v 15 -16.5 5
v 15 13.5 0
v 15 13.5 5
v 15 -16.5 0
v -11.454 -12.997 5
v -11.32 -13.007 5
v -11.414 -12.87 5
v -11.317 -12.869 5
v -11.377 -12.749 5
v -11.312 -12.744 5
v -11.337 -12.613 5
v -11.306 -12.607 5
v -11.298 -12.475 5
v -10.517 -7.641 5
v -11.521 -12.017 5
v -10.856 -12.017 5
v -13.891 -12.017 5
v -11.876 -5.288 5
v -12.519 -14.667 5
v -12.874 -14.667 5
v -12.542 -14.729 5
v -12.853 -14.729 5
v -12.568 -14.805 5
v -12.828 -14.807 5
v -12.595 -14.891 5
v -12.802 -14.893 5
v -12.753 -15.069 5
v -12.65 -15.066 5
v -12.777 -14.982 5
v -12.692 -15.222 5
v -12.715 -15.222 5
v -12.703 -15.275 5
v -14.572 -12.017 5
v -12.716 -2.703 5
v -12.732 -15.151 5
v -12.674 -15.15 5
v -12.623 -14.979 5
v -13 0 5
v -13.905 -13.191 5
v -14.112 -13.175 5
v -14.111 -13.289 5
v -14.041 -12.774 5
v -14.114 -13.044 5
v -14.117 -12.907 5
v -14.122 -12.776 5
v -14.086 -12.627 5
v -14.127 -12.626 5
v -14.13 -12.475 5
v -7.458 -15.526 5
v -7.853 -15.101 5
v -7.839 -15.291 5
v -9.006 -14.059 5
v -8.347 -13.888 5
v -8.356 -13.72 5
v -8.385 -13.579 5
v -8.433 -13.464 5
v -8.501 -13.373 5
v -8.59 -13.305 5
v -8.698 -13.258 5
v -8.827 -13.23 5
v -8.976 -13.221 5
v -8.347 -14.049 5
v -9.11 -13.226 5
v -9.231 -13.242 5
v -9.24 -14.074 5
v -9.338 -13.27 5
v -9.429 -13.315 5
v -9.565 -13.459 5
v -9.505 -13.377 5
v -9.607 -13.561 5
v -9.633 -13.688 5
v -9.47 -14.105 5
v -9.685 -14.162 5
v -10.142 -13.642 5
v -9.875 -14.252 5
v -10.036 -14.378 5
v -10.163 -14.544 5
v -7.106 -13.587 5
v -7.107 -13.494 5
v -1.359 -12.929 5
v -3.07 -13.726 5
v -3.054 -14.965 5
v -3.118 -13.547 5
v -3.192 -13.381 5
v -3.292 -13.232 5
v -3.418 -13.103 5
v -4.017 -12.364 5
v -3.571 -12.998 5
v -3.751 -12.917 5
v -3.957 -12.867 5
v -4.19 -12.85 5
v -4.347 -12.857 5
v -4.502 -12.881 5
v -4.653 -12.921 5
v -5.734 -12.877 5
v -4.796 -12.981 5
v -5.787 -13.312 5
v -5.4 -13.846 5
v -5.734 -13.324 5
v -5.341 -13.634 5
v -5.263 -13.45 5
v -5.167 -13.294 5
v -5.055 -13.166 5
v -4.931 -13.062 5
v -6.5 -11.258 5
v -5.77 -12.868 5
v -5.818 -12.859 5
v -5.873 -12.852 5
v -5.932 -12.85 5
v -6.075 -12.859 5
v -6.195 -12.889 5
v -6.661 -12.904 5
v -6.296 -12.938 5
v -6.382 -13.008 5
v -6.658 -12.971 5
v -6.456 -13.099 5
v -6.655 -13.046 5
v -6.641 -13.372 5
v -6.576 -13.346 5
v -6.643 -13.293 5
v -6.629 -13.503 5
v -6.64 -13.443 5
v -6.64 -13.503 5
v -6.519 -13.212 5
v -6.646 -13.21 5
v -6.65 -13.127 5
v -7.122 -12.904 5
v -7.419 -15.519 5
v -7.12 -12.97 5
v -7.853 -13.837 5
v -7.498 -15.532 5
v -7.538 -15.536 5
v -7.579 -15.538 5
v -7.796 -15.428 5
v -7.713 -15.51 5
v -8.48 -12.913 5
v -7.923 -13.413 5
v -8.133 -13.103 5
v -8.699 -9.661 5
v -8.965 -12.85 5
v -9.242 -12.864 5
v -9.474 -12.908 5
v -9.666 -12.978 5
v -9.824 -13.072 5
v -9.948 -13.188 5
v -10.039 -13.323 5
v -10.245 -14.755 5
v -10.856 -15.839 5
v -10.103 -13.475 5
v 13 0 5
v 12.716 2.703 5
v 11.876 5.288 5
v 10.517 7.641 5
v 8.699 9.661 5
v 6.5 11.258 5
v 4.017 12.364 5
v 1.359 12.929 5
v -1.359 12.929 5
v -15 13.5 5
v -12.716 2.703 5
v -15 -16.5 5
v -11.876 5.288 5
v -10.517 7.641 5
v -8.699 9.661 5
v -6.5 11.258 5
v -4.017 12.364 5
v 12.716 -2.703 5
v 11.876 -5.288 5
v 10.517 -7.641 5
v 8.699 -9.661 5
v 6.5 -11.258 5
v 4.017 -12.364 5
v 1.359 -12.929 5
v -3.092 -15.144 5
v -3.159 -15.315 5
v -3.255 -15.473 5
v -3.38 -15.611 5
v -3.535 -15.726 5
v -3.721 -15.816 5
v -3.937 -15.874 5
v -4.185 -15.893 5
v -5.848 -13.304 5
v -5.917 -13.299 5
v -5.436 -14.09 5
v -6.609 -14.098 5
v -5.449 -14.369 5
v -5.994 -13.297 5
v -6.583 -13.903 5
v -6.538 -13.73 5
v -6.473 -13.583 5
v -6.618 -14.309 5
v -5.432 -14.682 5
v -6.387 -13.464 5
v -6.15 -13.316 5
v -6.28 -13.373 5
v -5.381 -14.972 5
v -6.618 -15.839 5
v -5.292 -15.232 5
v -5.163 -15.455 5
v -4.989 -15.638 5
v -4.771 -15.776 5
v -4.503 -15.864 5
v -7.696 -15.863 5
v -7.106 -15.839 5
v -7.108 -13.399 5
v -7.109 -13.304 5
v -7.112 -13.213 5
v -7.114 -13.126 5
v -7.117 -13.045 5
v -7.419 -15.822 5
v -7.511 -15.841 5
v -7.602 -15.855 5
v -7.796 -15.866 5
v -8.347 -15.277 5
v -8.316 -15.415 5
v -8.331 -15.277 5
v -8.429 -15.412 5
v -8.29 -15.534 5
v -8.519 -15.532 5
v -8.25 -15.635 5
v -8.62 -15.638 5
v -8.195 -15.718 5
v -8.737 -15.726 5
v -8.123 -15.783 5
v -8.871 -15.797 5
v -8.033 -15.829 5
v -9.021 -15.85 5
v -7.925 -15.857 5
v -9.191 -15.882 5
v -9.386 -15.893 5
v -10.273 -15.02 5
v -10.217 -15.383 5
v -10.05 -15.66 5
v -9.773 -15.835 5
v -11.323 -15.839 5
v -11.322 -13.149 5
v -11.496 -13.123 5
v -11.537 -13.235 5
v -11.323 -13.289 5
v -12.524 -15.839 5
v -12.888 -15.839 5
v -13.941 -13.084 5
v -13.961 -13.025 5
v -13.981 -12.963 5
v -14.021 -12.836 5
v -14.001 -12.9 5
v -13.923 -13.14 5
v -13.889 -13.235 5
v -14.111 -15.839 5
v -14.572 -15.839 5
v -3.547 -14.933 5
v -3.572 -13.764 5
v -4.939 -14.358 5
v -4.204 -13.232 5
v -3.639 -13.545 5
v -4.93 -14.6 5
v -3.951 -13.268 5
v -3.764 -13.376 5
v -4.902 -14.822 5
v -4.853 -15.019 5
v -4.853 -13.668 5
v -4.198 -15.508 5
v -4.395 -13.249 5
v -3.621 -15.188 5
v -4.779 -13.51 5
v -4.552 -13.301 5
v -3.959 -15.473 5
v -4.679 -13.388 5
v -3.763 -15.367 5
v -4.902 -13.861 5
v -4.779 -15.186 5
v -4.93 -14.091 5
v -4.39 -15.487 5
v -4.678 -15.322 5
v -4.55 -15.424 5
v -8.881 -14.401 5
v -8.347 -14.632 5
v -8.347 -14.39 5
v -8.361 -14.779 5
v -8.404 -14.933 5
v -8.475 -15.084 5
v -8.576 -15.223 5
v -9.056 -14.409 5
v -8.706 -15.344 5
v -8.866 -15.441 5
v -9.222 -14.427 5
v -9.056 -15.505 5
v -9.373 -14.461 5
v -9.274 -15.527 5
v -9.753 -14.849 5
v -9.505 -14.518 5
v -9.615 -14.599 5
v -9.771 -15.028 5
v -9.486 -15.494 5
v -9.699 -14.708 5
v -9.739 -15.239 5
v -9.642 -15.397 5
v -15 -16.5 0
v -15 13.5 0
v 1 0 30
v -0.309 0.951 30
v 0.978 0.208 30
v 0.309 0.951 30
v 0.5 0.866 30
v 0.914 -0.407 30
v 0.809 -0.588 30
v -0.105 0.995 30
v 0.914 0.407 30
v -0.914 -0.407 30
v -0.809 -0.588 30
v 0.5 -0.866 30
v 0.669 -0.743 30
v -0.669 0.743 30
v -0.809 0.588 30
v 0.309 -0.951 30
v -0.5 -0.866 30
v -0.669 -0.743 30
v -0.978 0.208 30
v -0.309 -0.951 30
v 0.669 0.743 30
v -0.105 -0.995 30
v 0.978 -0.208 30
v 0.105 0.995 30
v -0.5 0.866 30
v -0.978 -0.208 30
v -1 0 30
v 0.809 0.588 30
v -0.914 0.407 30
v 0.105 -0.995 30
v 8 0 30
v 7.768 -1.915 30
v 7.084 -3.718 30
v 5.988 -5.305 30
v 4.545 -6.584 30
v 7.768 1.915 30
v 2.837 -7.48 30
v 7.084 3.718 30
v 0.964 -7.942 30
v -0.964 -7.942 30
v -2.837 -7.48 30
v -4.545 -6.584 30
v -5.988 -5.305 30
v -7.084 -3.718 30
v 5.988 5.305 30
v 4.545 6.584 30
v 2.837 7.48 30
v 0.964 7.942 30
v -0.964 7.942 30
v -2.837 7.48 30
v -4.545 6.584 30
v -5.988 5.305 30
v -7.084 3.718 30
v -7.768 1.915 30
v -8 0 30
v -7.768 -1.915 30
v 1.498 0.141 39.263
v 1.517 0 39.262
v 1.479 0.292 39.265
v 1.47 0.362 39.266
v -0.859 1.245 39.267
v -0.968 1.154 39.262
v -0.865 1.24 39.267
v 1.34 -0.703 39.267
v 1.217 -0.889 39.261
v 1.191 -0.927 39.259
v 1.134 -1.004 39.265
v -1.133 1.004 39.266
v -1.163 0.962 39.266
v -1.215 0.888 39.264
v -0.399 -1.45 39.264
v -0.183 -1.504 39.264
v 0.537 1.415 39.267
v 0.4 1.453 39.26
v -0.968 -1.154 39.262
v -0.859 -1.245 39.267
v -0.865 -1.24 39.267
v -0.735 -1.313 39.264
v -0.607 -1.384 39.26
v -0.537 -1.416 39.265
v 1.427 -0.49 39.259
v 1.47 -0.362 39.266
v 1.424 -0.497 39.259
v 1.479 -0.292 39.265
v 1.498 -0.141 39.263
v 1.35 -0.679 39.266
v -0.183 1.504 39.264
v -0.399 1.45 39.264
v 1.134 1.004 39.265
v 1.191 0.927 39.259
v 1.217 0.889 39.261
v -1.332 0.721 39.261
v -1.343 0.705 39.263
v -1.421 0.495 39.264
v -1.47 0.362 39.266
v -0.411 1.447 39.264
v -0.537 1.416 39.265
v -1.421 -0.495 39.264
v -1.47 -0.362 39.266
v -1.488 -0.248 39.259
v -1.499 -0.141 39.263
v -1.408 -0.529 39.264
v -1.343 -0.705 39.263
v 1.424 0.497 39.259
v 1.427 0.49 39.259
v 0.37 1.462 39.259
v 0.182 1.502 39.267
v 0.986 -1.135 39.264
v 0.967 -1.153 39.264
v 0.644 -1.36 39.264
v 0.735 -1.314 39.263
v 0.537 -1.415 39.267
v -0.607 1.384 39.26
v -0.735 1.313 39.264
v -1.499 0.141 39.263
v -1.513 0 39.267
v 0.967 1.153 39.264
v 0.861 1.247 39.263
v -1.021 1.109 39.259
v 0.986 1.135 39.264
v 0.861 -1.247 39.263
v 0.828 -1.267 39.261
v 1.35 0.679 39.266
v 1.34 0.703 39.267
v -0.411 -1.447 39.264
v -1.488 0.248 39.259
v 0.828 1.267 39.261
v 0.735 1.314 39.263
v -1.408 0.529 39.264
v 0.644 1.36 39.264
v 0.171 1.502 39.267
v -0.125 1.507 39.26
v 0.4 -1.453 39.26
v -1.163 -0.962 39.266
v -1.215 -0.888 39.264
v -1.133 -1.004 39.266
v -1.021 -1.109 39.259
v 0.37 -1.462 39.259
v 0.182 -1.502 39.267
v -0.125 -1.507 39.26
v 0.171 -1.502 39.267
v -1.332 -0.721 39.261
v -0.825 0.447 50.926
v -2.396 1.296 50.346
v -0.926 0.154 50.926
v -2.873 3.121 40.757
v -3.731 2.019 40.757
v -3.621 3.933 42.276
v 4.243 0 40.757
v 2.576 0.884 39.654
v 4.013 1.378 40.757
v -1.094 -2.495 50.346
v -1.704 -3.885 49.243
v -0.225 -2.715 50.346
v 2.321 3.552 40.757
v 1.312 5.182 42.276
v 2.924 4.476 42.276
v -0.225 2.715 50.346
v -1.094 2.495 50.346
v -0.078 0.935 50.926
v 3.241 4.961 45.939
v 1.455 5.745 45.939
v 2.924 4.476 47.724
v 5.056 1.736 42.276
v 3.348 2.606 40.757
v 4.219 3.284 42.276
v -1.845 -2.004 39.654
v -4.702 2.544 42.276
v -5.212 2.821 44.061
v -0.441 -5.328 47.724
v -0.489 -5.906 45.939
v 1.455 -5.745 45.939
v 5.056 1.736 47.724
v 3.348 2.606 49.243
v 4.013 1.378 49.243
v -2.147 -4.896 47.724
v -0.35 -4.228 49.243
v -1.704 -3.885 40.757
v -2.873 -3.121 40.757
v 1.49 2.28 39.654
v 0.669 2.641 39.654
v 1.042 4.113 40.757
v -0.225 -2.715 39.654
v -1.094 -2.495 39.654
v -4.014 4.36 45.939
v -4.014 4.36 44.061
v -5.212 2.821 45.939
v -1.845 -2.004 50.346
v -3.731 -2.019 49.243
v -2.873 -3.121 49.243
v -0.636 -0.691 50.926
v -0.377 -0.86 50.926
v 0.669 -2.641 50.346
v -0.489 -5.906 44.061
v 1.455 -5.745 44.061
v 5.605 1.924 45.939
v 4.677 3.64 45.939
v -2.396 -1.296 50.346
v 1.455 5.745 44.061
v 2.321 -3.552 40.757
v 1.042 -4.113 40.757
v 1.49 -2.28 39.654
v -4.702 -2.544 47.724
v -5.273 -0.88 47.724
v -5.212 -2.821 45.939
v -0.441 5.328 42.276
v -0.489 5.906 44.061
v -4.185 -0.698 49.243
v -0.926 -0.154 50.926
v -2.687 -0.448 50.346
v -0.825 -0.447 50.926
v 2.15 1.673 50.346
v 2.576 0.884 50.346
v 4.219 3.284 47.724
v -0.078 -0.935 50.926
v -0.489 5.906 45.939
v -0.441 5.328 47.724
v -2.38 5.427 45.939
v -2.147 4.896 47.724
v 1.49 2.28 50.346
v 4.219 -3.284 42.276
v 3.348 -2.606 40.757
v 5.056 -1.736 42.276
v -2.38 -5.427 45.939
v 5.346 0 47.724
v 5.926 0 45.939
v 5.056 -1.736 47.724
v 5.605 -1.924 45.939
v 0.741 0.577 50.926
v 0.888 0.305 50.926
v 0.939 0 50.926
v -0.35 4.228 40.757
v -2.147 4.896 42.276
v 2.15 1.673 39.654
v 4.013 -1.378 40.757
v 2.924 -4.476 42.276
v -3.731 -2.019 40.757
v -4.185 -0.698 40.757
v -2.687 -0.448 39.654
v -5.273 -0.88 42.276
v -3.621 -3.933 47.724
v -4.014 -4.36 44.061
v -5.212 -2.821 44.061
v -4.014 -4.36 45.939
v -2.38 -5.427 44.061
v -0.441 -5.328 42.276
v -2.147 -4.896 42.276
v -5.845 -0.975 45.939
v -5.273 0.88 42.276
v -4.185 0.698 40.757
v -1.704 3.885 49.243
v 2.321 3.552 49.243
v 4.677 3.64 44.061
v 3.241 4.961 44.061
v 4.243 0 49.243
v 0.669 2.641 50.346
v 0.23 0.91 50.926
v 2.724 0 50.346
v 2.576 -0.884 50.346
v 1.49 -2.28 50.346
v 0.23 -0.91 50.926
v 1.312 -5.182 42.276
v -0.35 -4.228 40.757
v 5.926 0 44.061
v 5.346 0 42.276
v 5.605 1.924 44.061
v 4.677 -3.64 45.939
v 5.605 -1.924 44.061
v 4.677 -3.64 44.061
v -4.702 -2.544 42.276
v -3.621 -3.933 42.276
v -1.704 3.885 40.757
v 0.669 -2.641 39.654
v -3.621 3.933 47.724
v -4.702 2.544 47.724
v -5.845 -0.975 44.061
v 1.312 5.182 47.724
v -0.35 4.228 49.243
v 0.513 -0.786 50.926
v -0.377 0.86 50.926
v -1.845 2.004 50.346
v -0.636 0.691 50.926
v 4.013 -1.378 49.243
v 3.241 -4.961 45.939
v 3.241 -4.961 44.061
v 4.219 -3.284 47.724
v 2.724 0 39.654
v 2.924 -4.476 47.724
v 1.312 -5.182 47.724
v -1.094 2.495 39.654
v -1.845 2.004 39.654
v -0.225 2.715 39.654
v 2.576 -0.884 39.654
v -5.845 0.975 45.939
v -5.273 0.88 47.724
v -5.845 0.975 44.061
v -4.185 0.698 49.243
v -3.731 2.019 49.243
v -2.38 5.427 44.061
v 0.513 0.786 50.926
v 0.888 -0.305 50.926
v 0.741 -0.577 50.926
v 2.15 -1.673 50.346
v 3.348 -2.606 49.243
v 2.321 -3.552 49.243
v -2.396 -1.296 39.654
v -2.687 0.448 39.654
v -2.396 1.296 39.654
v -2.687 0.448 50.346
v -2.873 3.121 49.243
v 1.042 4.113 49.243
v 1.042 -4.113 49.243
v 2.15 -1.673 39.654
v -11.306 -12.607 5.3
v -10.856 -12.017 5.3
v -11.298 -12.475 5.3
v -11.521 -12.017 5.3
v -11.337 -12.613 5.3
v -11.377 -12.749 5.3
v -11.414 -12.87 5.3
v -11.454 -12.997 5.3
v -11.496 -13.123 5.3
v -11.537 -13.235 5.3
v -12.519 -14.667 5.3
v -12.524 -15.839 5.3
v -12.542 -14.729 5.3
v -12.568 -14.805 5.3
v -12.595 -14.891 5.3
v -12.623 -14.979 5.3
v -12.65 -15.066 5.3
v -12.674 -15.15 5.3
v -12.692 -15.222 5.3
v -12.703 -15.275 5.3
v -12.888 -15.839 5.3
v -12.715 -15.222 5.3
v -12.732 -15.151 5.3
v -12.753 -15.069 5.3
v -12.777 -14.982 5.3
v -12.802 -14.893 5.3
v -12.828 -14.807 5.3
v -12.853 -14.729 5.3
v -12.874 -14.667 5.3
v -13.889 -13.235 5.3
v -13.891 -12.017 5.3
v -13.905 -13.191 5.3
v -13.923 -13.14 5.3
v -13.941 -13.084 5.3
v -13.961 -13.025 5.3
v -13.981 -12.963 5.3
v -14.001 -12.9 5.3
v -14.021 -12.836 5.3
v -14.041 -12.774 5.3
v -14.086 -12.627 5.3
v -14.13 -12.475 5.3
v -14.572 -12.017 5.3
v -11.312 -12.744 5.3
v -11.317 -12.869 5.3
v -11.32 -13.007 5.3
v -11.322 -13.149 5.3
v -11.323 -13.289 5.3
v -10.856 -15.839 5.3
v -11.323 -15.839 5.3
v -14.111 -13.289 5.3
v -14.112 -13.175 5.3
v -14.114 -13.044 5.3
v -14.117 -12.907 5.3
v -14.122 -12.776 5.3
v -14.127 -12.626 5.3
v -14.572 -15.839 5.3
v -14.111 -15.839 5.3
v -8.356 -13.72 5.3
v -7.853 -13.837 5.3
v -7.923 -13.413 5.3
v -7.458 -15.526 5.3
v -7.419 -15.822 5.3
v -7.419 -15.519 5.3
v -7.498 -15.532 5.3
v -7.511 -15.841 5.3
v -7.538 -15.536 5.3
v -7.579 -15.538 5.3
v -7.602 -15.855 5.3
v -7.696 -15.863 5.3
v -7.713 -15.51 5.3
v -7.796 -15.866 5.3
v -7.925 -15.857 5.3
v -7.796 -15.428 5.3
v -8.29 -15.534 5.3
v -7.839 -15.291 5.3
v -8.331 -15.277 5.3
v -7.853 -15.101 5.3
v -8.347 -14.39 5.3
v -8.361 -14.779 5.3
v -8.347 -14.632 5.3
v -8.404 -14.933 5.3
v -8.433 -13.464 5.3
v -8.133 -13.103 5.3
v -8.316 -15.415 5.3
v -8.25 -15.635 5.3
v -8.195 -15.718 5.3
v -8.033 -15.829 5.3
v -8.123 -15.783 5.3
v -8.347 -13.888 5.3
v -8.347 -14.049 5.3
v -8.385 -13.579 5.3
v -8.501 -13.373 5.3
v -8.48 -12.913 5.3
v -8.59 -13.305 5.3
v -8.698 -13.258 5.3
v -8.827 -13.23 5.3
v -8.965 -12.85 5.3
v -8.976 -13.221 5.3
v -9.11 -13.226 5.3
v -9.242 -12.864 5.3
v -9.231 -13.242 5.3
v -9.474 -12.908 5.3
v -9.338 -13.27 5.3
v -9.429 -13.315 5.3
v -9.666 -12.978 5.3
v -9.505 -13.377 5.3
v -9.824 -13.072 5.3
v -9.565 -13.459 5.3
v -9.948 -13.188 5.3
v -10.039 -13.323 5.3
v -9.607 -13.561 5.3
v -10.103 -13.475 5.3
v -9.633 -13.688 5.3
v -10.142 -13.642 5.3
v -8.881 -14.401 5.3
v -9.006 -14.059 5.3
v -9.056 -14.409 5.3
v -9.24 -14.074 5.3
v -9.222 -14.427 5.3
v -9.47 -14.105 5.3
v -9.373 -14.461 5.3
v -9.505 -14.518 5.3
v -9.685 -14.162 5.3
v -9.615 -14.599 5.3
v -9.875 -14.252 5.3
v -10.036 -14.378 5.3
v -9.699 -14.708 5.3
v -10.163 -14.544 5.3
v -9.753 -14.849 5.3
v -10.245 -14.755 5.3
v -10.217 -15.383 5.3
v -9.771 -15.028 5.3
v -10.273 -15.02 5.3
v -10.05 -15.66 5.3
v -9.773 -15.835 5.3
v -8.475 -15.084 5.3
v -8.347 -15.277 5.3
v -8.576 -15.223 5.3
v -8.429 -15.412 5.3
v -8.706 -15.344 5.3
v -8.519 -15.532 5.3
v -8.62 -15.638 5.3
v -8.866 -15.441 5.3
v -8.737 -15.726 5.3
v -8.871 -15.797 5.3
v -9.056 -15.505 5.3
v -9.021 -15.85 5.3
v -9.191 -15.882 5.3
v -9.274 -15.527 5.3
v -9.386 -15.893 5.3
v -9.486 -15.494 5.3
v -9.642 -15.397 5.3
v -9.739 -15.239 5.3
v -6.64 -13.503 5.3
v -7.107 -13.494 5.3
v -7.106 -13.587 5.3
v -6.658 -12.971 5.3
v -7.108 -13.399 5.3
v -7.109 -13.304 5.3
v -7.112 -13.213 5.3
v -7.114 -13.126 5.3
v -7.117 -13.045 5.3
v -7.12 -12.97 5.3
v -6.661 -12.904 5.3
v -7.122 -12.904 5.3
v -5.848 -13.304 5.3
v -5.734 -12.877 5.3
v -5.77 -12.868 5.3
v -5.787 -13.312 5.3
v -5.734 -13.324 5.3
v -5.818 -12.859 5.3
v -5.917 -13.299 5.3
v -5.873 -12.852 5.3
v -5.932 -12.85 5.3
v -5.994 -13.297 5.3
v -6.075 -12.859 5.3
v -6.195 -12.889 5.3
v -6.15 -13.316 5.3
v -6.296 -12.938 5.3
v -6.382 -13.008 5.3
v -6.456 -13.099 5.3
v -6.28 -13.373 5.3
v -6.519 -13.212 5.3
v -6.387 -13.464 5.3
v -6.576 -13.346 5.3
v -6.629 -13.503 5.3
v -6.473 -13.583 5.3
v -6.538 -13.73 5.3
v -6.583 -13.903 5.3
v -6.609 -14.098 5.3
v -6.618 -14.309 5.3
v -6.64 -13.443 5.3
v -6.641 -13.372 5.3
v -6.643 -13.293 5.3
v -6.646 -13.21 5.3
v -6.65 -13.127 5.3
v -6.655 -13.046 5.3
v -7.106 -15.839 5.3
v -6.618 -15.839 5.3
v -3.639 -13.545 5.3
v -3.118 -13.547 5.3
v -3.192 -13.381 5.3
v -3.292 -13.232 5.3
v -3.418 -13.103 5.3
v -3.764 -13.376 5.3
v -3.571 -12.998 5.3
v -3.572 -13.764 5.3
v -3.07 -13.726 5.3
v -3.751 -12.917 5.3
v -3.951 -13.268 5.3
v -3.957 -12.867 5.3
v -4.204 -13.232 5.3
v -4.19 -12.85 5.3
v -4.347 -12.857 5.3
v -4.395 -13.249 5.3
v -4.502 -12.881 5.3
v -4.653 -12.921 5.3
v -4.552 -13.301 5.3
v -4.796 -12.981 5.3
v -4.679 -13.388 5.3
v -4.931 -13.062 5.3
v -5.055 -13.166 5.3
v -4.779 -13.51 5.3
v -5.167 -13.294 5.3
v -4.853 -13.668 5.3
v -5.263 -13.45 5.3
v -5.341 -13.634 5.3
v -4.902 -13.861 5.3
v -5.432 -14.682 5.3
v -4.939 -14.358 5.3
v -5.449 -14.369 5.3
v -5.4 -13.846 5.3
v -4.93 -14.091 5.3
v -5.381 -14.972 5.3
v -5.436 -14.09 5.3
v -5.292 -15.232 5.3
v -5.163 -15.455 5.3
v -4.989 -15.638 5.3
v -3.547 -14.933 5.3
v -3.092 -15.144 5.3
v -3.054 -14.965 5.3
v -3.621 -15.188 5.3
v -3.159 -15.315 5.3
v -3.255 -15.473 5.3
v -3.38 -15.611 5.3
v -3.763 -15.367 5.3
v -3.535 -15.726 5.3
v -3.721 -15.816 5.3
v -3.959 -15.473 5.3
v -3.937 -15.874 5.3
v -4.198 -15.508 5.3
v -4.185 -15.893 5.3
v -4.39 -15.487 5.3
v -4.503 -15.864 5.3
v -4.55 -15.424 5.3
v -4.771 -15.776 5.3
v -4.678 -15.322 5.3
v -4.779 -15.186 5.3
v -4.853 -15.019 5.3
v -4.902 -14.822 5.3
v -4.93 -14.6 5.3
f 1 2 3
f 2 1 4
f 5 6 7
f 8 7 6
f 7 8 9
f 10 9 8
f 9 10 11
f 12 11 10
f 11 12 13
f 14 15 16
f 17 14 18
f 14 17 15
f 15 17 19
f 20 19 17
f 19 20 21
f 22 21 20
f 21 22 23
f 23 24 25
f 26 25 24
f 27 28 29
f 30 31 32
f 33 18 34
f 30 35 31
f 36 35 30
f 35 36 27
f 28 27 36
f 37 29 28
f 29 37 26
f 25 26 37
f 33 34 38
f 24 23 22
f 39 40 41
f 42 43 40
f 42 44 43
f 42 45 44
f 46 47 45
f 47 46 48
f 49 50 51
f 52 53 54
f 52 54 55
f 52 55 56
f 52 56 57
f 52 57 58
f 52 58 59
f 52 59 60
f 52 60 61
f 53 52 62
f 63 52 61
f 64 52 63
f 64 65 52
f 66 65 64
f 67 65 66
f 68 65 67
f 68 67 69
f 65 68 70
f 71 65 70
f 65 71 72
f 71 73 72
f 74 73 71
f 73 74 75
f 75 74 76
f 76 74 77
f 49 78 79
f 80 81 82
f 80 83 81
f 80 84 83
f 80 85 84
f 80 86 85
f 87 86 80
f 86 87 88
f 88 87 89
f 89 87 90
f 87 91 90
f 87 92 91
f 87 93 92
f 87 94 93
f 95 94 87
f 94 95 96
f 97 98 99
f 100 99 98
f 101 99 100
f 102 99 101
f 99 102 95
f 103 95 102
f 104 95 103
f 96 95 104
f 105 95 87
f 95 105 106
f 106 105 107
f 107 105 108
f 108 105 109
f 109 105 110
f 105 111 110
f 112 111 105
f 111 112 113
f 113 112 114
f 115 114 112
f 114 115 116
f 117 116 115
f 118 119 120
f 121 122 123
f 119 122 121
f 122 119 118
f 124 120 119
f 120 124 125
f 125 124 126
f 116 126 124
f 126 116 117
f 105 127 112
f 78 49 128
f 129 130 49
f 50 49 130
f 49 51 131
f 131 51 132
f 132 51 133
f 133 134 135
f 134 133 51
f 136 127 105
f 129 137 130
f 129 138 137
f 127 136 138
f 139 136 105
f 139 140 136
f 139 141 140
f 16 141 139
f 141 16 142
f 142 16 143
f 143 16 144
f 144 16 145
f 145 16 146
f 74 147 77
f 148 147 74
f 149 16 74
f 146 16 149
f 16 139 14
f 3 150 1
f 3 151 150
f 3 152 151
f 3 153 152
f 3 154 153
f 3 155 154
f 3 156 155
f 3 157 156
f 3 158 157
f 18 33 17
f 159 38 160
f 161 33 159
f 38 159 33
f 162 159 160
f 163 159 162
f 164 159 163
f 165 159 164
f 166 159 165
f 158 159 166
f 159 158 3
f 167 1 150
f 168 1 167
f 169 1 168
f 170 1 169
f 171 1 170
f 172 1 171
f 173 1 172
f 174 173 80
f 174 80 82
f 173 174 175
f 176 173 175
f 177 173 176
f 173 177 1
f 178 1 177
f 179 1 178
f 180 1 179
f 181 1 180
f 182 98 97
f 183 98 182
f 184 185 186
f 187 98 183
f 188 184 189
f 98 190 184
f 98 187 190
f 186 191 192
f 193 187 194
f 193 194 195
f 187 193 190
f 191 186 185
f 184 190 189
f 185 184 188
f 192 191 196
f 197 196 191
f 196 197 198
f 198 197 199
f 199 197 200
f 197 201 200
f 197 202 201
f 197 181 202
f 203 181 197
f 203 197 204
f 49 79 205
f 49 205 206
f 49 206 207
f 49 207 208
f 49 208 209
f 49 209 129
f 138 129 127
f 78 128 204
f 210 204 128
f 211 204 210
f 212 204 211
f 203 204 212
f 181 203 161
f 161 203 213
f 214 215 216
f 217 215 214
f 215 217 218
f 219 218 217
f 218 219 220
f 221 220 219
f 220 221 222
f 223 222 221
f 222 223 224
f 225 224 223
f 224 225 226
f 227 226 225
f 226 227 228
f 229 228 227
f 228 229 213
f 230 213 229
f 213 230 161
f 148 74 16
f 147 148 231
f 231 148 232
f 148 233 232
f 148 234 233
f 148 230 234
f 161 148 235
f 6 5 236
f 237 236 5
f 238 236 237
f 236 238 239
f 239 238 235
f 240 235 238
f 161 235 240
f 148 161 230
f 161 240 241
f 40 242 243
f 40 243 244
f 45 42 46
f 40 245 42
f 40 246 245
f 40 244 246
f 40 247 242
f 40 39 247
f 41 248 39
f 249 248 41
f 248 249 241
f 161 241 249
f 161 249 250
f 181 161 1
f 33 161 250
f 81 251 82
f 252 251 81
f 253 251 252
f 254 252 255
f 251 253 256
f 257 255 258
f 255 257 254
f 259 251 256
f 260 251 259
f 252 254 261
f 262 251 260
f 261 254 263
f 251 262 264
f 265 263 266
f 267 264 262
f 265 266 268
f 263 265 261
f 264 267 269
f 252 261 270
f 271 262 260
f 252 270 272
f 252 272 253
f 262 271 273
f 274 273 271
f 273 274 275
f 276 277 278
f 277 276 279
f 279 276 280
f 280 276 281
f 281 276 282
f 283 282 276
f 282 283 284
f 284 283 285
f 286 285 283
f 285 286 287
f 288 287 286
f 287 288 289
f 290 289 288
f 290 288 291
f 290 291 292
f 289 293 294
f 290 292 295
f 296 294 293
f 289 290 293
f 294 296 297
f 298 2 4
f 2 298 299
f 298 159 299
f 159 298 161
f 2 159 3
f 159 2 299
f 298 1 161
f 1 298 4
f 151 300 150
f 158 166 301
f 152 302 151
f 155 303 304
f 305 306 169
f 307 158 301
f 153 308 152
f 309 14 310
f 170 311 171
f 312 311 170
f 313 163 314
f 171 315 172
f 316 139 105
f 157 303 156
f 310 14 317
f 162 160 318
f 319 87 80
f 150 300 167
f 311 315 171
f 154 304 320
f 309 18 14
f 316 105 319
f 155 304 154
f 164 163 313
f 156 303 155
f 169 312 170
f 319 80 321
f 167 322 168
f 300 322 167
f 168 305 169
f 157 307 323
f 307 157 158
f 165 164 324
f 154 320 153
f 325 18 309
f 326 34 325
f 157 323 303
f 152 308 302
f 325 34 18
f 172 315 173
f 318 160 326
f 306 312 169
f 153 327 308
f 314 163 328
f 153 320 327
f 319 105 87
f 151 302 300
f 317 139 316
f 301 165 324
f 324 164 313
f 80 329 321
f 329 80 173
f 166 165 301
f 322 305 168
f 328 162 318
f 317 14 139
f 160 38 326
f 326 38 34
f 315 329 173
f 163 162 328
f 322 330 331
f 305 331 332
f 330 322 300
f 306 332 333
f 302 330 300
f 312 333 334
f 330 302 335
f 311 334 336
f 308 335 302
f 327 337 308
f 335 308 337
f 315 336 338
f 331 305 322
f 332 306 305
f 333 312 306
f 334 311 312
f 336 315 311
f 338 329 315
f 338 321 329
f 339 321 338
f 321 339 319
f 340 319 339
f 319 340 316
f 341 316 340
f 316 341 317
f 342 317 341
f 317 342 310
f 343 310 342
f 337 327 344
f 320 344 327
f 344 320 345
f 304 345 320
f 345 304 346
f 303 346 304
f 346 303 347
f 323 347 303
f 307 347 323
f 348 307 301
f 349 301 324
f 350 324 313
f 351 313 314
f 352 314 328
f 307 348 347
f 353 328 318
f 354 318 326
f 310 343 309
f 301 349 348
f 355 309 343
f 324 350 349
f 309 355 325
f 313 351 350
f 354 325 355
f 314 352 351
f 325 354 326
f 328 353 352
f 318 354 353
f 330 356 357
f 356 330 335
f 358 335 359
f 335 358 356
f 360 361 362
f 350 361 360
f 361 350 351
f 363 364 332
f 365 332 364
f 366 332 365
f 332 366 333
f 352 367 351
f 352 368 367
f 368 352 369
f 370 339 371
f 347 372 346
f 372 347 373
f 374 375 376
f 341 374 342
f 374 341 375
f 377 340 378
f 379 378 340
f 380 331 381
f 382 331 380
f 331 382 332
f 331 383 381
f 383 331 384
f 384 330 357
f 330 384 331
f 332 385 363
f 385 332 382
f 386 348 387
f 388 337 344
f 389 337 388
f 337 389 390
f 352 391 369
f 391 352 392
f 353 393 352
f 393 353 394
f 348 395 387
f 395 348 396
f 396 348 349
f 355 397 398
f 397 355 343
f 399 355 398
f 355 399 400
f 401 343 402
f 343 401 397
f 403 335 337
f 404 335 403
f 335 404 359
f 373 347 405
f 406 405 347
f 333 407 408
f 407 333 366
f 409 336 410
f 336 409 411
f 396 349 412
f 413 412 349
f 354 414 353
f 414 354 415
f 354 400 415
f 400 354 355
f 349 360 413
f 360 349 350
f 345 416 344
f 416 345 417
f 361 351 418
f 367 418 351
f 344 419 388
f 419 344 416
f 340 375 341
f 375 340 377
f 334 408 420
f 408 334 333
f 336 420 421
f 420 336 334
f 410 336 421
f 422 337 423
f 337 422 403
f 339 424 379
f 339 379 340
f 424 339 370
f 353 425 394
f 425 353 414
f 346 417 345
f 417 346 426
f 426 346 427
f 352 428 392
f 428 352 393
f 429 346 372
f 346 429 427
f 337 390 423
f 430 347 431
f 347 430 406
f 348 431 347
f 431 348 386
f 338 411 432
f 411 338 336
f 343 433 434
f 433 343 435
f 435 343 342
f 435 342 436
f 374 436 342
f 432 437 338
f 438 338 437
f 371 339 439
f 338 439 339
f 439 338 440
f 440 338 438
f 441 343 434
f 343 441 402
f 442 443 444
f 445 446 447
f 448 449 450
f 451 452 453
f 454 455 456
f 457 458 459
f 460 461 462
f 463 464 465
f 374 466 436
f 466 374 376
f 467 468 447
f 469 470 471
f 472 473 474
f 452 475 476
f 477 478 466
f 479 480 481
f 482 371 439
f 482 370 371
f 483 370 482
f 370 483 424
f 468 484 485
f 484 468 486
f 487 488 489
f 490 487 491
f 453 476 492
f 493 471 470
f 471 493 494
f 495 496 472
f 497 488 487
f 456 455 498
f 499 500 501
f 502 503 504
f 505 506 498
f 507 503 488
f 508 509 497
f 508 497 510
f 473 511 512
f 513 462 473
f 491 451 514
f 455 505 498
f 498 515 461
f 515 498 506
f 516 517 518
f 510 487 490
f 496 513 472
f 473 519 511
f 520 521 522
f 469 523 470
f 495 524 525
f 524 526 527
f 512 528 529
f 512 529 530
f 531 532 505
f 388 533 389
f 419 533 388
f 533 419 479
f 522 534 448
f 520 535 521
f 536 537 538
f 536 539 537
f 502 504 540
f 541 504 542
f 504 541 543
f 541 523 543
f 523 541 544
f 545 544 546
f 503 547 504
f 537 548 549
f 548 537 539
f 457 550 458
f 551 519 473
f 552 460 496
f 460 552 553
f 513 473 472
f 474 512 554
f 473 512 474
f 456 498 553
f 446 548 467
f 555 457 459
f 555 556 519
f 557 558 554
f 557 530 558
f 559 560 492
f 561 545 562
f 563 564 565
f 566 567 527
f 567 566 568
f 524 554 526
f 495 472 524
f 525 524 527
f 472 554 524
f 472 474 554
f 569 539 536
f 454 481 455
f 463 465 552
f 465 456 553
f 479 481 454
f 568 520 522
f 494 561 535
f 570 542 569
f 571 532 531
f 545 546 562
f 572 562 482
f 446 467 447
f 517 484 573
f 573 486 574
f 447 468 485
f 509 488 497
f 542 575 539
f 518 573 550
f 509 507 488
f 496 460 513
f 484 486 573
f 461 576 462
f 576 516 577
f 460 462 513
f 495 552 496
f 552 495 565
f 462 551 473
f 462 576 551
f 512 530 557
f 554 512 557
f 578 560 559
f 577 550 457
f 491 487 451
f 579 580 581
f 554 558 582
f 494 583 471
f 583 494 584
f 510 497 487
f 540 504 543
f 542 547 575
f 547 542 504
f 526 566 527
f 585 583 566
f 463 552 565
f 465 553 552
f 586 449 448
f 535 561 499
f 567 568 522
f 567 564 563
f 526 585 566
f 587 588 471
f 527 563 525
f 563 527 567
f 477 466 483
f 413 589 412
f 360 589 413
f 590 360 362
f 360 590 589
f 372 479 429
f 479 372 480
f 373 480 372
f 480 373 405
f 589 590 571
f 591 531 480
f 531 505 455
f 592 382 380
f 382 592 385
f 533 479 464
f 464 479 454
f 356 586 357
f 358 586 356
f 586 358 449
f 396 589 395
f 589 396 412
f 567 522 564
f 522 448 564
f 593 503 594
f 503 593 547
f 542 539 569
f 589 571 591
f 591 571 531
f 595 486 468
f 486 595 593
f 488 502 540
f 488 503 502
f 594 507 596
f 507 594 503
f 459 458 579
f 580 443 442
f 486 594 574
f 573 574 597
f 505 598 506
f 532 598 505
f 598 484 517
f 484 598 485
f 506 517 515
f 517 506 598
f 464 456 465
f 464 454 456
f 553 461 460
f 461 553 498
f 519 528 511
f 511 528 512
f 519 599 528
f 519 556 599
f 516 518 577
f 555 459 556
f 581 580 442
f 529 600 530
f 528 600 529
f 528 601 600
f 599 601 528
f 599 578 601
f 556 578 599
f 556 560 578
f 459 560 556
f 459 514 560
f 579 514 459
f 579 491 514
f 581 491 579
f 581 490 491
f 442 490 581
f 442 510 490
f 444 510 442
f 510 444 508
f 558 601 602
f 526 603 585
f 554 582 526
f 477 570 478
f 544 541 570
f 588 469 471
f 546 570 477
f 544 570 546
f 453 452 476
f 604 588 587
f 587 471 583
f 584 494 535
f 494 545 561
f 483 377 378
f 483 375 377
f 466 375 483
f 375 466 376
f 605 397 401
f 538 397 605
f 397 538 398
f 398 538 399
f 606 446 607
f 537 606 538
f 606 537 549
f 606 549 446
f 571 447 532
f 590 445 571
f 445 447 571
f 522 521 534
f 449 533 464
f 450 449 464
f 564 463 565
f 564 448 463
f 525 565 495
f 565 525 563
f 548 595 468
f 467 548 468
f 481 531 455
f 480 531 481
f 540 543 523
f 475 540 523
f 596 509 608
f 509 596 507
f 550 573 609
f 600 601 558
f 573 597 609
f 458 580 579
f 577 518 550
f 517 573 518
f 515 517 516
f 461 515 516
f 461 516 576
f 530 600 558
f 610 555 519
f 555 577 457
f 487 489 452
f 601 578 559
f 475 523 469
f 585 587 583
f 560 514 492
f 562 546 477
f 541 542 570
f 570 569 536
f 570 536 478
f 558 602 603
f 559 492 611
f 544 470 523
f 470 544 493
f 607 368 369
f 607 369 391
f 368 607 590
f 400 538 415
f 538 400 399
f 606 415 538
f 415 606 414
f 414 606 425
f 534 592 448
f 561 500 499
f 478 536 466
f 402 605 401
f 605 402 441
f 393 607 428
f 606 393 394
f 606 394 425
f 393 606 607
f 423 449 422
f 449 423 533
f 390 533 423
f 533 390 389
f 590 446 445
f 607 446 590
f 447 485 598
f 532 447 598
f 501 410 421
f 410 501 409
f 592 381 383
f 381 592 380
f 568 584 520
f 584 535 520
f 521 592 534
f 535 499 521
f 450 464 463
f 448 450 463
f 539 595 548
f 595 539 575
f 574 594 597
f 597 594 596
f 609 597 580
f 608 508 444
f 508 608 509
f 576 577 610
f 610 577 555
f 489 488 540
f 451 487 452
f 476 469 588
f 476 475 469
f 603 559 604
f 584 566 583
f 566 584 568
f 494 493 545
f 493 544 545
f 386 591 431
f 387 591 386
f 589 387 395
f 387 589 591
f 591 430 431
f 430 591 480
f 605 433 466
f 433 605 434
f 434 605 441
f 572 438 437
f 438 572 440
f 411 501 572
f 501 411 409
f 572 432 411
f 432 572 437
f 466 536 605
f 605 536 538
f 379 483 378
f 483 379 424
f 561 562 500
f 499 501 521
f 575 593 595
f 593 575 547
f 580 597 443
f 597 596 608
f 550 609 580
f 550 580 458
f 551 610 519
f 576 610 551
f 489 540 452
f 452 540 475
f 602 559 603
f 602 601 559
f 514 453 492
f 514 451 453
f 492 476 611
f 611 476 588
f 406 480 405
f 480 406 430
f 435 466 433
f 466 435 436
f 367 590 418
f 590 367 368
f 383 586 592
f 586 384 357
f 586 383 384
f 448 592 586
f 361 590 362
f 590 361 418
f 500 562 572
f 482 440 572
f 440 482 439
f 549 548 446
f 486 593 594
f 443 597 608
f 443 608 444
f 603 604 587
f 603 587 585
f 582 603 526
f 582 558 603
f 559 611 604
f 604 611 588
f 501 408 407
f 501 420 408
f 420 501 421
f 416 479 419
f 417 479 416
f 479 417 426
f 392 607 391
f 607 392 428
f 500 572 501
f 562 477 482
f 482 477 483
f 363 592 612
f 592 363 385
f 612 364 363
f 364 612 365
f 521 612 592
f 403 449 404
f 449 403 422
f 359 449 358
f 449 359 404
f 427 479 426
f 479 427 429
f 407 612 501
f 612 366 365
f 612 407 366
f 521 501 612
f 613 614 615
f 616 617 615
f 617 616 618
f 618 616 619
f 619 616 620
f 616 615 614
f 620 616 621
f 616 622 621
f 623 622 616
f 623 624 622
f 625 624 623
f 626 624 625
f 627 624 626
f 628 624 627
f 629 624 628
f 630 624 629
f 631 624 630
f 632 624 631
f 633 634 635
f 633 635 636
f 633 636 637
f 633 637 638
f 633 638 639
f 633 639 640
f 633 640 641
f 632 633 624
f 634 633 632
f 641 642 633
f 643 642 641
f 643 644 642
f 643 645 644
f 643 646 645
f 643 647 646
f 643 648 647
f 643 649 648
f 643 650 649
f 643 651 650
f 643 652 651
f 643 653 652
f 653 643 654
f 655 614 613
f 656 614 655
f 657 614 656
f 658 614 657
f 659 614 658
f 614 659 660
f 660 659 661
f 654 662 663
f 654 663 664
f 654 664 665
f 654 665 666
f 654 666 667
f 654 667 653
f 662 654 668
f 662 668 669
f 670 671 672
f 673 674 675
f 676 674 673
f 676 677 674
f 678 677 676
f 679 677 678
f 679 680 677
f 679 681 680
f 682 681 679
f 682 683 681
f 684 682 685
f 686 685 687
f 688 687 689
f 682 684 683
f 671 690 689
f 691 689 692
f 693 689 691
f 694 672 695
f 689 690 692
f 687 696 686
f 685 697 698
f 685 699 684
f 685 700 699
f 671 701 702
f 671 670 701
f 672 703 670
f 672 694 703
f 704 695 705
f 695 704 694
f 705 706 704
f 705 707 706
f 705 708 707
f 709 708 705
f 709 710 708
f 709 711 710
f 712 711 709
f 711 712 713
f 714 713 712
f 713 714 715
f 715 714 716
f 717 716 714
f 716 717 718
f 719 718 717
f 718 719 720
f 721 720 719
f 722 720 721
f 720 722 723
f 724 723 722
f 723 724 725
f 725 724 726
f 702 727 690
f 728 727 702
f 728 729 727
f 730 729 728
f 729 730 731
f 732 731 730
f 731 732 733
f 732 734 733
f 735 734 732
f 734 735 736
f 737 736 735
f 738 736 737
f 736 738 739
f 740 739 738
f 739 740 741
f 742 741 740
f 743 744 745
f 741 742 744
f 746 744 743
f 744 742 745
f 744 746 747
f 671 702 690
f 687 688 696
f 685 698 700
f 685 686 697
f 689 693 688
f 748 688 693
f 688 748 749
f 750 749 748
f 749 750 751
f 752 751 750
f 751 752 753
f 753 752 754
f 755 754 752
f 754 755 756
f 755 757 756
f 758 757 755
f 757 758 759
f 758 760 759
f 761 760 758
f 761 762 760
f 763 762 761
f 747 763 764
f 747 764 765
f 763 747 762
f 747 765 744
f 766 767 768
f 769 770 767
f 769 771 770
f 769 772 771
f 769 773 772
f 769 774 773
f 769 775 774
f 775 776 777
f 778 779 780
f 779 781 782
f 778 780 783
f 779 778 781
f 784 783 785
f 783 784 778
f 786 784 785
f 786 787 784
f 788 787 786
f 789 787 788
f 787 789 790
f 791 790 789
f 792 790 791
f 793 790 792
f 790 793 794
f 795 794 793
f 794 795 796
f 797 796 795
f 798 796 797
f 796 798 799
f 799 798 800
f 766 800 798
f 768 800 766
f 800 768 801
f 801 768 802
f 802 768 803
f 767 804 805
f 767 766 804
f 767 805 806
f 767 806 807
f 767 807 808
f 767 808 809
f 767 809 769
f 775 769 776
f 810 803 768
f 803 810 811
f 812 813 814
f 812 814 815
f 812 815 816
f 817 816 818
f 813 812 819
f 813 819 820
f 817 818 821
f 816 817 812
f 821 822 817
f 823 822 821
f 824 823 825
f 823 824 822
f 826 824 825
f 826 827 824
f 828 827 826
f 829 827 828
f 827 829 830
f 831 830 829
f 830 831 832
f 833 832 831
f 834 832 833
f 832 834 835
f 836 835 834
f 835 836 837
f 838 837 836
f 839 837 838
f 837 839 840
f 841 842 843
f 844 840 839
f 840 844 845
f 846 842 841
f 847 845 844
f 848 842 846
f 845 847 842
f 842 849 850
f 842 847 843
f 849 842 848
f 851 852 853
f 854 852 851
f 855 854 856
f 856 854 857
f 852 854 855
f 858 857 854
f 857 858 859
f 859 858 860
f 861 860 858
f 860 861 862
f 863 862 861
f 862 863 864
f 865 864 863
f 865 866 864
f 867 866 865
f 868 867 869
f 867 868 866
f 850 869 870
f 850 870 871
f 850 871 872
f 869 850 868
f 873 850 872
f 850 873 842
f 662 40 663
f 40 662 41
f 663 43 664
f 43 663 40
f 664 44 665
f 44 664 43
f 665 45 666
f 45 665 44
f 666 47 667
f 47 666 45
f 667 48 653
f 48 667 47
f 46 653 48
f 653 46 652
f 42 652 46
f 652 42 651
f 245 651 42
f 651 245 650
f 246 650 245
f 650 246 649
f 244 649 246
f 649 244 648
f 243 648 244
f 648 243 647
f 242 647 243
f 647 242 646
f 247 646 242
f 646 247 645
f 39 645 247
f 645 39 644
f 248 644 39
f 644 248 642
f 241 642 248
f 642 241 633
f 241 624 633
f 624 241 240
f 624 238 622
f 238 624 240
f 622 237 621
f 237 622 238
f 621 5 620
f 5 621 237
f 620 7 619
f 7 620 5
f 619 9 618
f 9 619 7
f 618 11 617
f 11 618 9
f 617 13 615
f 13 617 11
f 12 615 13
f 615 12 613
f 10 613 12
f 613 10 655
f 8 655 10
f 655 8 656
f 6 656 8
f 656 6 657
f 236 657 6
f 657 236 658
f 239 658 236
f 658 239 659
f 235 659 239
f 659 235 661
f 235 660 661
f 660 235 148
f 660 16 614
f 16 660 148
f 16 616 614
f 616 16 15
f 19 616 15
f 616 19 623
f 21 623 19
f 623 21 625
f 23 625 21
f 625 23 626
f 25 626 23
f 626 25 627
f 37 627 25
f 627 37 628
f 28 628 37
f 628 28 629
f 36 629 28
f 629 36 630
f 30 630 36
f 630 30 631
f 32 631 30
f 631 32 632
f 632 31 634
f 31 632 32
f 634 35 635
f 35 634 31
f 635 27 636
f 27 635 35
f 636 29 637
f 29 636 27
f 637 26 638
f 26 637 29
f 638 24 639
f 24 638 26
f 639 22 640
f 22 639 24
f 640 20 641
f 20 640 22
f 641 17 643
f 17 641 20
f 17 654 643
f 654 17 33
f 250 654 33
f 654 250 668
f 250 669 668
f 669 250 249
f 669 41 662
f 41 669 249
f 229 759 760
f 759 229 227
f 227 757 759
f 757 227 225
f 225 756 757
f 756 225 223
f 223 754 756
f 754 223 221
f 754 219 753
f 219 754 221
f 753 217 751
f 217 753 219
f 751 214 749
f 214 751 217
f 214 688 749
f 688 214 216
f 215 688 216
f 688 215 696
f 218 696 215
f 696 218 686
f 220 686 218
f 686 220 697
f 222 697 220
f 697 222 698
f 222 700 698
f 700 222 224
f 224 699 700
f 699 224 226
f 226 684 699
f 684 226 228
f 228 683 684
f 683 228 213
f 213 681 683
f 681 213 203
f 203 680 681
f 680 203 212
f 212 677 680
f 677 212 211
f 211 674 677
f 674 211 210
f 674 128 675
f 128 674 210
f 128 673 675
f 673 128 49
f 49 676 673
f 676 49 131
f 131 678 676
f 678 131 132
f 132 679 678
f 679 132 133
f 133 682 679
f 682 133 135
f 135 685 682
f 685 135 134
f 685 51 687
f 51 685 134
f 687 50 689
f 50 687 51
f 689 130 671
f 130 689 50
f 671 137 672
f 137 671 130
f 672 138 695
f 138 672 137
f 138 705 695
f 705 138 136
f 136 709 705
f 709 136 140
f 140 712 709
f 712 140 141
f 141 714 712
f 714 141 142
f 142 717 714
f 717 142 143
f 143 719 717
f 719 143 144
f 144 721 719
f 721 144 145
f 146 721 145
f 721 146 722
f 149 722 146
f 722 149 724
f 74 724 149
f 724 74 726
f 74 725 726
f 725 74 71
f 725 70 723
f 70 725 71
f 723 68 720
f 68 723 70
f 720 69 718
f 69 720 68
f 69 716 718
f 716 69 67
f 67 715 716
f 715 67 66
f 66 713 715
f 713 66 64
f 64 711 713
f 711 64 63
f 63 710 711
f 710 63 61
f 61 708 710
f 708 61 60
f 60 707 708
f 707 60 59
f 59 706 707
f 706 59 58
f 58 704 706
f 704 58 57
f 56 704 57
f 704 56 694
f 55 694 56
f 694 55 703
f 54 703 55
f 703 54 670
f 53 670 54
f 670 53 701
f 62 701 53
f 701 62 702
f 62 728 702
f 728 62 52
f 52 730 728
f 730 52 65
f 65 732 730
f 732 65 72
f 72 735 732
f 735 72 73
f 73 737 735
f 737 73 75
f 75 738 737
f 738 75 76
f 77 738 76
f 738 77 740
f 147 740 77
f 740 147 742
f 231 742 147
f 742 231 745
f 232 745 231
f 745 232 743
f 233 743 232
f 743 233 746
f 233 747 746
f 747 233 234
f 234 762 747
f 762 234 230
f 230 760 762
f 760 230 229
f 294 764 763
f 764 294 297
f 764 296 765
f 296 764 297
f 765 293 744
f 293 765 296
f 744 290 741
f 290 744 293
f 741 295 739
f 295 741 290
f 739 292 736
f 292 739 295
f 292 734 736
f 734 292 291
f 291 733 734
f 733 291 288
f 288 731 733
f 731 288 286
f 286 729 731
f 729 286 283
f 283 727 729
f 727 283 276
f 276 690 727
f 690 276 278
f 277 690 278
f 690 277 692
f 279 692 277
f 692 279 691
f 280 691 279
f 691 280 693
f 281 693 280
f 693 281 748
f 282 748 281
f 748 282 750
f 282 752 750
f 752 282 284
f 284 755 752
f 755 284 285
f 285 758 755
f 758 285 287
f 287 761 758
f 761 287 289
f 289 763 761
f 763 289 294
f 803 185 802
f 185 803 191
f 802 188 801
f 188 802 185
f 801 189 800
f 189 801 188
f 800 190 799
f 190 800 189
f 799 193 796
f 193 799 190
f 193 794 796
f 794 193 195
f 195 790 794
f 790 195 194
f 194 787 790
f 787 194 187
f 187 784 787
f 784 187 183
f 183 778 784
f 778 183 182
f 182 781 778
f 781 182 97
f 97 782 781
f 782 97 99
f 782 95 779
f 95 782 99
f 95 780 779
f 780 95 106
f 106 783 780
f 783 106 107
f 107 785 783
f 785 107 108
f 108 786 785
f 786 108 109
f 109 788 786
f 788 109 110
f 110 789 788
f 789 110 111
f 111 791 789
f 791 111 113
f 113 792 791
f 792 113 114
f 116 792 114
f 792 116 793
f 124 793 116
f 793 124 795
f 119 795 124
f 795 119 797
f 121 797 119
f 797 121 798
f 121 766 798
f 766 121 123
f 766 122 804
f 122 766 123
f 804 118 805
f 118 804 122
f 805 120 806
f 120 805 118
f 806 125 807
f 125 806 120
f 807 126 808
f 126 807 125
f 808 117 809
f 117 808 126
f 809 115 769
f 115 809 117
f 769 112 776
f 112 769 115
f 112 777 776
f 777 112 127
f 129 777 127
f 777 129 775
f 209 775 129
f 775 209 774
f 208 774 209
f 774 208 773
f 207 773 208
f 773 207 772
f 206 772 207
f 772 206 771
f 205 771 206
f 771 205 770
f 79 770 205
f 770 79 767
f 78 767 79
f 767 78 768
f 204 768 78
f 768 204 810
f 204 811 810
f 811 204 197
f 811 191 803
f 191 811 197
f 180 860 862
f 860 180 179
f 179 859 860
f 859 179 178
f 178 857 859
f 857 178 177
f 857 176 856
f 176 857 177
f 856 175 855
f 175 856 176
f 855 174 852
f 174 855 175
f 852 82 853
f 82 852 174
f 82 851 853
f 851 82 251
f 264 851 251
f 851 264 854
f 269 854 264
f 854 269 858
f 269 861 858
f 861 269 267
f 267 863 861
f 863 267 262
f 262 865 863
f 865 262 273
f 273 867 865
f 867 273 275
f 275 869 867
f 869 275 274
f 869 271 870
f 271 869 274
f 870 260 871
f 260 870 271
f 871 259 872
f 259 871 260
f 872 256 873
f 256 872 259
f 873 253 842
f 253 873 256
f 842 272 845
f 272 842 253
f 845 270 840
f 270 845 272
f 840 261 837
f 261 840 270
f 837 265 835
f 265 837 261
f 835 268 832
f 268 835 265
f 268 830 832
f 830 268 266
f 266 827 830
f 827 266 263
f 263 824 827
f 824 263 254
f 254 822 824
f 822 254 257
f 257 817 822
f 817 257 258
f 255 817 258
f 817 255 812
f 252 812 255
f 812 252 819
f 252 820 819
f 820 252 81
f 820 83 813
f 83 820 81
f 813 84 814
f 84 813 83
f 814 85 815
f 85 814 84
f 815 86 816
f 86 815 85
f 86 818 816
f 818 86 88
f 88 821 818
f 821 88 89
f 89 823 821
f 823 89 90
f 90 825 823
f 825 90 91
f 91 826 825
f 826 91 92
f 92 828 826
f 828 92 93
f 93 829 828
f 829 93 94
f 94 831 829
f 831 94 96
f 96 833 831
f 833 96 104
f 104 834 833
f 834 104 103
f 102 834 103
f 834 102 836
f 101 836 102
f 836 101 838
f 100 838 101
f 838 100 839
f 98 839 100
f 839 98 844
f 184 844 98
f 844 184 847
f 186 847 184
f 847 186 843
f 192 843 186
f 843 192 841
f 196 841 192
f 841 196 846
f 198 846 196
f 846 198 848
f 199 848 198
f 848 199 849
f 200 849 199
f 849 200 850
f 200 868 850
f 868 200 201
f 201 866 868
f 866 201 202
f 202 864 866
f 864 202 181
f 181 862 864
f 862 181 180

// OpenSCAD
// Figura realizada: Peón, pieza de ajedrez

//Base plana del peón con cubo de dimensiones 30x30 con su traslación
translate([-15,-16.5,0])  
cube([30,30,5]);

//Cuerpo del peón (parte inferior) con cilindro de 25x13, y traslación 5 para colorcarlo sobre la base
translate([0,0,5])
cylinder(25, 13);

//Cuerpo del peón (parte superior) con otro cilindro de 10x8, y 30 unidades sobre Eje z (encima del anterior)
translate([0,0,30])
cylinder(10,8);

//Cabeza del peón con esfera radio=6
translate([0,0,45])
sphere(6);

//Grabado de texto 'Marc' (nombre del autor) sobre la base del peón (cubo), aportando relieve de altura 0.3
translate([-9, -14, 5])
linear_extrude(height=0.3)
text("Marc", size=4, halign="center", valign="center");

    
